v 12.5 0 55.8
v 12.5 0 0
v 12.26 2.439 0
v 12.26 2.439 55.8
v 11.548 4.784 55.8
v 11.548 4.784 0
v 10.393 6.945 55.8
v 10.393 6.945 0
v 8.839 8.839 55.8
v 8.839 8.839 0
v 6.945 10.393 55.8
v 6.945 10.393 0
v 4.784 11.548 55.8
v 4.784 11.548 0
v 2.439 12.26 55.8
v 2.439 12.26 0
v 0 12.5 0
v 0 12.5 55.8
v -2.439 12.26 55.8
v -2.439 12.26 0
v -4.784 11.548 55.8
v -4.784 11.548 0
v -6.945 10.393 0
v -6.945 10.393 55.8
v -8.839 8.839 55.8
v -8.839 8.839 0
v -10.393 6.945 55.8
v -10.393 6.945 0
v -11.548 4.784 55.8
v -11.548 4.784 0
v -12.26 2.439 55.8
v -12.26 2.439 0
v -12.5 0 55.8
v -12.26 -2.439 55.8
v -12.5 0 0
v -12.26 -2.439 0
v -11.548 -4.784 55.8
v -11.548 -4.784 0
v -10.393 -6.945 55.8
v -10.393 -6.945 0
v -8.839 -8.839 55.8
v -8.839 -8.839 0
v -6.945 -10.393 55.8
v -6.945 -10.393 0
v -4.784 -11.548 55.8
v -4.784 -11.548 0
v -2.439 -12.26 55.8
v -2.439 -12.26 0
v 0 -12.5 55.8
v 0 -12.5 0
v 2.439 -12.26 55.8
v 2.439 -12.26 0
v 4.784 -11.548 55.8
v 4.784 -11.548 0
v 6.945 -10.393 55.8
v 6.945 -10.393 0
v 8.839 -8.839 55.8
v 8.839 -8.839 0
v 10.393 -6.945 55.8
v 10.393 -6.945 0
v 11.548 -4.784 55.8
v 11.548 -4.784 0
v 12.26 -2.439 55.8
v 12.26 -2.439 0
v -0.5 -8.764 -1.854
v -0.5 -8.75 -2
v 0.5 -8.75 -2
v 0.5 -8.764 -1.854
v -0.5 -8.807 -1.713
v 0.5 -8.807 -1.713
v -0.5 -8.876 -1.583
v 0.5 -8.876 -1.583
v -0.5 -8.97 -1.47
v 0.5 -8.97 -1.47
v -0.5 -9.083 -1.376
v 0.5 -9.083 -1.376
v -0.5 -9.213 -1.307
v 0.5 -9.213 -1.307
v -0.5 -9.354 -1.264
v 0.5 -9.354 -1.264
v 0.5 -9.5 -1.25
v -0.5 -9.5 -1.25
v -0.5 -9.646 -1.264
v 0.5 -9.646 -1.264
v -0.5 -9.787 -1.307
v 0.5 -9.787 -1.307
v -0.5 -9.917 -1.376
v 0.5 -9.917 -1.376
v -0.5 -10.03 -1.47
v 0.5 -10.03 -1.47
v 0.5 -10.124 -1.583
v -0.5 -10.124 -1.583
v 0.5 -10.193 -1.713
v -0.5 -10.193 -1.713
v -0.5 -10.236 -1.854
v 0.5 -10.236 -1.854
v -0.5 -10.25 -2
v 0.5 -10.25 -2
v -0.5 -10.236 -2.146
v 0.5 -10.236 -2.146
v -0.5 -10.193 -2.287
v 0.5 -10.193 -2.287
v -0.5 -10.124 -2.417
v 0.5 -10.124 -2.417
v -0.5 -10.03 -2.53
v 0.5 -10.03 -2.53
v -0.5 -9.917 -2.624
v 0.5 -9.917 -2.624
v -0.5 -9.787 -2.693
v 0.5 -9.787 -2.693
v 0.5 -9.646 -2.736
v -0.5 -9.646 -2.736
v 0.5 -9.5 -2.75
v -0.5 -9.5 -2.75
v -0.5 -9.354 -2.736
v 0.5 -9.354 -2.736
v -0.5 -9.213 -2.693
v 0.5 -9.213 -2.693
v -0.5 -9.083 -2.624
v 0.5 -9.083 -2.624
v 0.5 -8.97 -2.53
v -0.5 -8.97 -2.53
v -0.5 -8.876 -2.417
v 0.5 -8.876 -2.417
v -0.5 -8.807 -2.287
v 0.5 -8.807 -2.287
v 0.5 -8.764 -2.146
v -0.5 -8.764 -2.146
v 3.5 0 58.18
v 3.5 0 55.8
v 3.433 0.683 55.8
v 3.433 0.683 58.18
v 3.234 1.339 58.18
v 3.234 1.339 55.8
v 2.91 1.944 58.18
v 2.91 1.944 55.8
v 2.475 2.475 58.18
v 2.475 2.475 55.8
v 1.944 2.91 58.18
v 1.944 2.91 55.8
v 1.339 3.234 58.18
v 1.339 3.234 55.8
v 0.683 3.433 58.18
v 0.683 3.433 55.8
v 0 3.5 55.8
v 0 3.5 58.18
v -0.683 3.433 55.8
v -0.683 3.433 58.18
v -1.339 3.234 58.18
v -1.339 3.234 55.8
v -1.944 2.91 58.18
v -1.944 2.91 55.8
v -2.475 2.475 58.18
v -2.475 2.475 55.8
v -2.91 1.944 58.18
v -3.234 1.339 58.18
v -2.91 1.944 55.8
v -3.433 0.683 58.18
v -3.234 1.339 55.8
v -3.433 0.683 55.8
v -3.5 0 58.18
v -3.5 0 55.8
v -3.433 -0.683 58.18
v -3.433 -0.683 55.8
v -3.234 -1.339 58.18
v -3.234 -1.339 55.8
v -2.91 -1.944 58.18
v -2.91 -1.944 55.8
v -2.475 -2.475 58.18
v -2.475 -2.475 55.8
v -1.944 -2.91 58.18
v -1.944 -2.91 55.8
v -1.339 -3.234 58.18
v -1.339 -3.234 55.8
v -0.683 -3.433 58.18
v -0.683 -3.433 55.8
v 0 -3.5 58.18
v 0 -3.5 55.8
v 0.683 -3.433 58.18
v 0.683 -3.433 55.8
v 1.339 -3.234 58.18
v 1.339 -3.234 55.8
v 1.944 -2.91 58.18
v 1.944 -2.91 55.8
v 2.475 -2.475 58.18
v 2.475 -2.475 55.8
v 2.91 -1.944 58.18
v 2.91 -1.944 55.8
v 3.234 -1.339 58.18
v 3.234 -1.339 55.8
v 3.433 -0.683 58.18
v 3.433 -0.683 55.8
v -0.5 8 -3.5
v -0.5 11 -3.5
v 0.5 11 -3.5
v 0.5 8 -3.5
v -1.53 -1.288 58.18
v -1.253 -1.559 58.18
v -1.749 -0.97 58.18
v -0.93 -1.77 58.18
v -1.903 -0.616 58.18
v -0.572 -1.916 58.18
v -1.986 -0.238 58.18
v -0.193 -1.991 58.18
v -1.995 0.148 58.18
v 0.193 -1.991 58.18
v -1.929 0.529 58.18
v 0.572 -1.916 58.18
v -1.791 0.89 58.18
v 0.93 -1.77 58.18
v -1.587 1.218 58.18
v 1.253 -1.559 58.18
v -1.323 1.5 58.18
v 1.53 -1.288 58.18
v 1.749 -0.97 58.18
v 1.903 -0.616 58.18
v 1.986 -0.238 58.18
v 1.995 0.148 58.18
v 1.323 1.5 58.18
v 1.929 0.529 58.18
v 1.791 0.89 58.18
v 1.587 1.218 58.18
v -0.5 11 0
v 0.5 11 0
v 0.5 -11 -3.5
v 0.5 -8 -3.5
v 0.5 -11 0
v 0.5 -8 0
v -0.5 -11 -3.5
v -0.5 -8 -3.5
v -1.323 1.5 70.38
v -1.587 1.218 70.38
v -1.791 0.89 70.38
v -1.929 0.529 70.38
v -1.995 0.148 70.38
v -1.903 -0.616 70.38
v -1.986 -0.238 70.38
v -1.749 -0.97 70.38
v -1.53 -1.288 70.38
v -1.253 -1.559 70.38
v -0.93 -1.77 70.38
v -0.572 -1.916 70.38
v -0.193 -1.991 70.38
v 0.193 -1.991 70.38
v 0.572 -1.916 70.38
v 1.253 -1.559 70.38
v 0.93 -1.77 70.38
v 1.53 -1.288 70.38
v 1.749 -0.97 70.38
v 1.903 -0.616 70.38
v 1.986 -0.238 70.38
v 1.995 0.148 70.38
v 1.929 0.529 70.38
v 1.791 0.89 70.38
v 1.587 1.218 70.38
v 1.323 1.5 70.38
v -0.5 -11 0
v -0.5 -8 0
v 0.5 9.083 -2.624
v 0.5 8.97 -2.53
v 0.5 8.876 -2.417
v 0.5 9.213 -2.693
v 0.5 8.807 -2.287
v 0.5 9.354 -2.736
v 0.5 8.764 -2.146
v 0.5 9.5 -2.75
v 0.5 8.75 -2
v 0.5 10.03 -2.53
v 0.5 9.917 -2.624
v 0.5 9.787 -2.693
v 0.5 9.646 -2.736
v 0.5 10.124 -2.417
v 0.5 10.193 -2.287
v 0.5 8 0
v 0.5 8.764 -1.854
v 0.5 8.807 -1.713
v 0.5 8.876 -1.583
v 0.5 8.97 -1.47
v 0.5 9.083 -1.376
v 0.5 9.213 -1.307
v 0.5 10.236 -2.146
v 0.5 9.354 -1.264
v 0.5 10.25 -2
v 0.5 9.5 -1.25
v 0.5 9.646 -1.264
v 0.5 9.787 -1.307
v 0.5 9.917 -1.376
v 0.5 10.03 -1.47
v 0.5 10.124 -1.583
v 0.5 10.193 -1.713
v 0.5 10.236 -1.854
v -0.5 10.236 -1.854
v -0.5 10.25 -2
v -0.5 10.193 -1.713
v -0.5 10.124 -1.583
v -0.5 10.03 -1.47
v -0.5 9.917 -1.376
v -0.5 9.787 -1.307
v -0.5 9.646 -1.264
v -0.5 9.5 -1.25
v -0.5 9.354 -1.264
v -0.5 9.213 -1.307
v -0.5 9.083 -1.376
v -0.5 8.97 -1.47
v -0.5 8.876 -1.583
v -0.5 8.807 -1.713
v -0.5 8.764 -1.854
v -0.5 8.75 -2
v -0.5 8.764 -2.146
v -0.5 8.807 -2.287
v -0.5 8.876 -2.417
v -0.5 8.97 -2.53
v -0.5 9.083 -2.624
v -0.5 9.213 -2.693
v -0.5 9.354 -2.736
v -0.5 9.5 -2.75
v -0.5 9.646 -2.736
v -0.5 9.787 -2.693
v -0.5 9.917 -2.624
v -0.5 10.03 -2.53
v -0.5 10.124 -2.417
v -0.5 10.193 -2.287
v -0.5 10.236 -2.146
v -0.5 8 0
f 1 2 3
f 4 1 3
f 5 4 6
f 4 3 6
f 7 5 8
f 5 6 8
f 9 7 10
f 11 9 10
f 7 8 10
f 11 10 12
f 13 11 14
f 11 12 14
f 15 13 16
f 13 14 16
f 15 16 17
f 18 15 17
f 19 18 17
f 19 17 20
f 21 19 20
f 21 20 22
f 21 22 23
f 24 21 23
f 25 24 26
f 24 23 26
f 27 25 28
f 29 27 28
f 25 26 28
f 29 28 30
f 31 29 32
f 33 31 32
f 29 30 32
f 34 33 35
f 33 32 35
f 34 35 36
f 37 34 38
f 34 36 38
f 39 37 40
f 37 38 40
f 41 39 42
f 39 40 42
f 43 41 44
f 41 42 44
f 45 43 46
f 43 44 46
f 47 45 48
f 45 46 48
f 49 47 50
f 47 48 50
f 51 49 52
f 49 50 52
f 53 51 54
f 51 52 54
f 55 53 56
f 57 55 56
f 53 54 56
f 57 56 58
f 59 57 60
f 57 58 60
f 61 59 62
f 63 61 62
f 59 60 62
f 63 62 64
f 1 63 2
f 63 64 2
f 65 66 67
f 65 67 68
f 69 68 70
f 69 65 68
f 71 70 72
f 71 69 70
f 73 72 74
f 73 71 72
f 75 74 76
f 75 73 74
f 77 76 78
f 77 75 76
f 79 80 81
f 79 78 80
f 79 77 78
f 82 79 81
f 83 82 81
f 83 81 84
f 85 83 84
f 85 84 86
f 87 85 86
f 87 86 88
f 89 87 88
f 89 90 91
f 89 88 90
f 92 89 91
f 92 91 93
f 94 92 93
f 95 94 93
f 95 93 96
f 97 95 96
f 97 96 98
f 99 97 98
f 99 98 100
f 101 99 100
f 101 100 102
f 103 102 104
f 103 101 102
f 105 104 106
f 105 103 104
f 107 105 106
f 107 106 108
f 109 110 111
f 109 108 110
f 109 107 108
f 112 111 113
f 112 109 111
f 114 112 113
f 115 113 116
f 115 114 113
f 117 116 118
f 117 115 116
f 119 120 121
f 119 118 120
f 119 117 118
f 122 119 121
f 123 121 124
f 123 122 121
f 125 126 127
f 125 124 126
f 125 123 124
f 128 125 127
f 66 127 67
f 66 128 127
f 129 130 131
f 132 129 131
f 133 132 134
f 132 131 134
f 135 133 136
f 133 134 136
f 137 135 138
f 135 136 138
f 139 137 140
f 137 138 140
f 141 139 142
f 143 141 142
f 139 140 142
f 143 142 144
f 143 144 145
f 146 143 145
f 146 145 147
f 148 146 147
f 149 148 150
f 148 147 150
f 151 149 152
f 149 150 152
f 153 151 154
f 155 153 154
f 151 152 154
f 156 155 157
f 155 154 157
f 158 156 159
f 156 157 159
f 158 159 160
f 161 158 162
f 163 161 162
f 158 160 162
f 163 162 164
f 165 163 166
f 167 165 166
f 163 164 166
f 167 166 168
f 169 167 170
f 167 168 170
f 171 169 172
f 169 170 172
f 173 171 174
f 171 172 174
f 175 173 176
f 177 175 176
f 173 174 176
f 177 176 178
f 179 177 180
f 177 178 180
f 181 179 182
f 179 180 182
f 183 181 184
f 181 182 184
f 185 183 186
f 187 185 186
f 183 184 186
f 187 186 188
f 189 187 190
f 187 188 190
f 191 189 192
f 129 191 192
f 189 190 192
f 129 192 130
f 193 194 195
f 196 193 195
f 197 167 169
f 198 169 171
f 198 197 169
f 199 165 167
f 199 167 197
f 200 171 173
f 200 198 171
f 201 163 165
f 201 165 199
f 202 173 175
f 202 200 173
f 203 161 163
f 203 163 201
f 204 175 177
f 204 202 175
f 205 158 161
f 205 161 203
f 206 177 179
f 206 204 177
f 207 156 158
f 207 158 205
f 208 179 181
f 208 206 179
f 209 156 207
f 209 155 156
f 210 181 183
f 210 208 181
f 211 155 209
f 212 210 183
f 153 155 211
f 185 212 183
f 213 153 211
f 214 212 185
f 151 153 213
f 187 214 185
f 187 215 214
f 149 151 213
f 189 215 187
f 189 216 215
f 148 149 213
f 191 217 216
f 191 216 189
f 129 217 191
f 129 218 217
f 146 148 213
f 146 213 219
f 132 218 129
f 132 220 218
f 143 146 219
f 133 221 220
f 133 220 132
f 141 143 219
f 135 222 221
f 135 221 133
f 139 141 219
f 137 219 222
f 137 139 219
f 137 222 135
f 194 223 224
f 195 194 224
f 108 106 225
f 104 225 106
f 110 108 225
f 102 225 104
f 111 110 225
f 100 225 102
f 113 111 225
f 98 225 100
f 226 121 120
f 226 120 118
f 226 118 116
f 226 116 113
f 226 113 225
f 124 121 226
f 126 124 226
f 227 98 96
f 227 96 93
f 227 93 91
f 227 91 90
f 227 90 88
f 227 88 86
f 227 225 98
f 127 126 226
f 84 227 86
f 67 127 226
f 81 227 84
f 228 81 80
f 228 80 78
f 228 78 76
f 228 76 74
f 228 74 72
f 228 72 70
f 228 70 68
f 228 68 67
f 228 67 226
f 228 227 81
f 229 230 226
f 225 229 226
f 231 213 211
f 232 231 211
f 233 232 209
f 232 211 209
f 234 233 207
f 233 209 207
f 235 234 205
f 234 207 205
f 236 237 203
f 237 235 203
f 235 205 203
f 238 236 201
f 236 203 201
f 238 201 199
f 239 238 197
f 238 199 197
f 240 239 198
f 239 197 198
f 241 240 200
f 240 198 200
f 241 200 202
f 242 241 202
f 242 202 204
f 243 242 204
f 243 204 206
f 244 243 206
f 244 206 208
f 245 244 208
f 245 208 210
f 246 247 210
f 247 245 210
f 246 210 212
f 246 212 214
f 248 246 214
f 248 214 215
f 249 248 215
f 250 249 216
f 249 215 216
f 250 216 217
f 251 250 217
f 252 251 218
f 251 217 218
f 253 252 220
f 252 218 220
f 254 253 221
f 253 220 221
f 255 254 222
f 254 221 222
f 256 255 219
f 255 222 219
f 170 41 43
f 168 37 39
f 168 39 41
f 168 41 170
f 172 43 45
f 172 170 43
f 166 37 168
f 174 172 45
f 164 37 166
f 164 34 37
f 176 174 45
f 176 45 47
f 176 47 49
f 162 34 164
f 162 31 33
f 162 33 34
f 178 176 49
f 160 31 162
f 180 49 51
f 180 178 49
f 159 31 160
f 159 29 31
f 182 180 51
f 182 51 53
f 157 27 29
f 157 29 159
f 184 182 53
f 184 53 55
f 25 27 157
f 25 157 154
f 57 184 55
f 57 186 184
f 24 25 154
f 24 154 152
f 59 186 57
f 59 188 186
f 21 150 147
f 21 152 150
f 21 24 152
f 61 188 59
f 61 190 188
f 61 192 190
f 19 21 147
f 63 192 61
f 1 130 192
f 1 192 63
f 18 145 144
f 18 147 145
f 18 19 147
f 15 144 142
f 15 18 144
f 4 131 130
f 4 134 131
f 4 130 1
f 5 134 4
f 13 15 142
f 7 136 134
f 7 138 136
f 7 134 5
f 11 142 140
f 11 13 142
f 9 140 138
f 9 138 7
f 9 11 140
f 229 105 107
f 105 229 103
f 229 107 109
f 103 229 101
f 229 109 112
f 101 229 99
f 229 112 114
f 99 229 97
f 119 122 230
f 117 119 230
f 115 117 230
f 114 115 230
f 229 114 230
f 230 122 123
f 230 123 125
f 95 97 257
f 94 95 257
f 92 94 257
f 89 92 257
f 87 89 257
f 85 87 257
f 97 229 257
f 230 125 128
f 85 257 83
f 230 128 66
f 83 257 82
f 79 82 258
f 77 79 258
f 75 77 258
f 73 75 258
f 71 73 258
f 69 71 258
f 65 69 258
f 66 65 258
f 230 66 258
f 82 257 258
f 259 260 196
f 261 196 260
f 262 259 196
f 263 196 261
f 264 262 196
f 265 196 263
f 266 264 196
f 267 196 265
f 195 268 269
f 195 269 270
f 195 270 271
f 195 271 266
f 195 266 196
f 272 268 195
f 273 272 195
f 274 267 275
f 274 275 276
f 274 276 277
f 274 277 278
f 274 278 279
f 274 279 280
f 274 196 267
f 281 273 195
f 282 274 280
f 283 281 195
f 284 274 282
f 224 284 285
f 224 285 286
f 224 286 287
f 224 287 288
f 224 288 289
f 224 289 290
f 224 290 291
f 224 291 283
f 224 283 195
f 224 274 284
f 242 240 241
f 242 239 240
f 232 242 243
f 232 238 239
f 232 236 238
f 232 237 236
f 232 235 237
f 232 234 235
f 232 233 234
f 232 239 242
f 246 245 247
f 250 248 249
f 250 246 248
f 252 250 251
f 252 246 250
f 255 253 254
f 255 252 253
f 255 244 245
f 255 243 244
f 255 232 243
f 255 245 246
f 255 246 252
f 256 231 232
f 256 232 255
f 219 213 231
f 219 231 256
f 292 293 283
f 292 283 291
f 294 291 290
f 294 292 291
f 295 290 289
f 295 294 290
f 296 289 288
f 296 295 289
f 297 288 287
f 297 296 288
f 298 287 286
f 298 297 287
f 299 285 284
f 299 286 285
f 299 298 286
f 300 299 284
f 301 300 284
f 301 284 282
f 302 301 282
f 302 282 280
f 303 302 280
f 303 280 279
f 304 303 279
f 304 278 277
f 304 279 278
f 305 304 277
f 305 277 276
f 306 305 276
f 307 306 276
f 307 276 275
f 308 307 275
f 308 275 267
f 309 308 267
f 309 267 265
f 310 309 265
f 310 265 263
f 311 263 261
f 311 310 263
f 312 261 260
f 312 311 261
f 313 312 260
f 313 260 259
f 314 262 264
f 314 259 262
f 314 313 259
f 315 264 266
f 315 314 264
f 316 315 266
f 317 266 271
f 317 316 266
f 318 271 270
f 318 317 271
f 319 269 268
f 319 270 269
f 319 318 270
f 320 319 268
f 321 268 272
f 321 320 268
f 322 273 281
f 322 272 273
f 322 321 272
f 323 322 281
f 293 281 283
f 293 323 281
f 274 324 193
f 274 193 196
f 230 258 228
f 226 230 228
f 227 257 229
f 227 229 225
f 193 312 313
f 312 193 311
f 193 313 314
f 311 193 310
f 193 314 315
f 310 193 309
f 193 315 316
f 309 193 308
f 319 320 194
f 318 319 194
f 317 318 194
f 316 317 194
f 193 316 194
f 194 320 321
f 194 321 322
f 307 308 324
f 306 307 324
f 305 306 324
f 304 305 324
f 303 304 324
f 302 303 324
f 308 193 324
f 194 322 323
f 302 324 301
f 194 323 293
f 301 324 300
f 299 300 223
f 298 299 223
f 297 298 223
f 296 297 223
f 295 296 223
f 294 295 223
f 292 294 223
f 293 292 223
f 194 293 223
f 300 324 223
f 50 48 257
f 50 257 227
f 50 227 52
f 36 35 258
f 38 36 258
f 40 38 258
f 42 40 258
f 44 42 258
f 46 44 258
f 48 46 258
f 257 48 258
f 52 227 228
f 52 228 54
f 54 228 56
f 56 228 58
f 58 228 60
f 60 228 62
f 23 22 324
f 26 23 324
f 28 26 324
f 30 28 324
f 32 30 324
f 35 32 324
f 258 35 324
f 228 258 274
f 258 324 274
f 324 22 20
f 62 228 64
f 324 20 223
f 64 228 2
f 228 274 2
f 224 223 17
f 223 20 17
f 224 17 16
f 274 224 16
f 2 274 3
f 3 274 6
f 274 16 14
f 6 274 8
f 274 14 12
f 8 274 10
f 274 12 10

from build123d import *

# Parameters (mm, degrees)
SKETCH1_R               = 12.5
BOSS_EXTRUDE1_DEPTH     = 55.8
BOSS_EXTRUDE2_START     = 55.8
SKETCH2_R               = 3.5
BOSS_EXTRUDE2_DEPTH     = 2.38
BOSS_EXTRUDE3_START     = 58.18
SKETCH3_R               = 2
BOSS_EXTRUDE3_DEPTH     = 12.2
SKETCH5_W               = 2.645751312
SKETCH5_H               = 1.197132969
CUT_EXTRUDE1_DEPTH      = 12.2
SKETCH6_W               = 1
SKETCH6_H               = 3
BOSS_EXTRUDE4_DEPTH     = 3.5
CUT_EXTRUDE2_DEPTH      = 73.566138109
CUT_EXTRUDE2_DEPTH_BACK = 73.566138109
SKETCH7_R               = 0.75


with BuildPart() as part:
    # Sketch1 → Boss-Extrude1 (new body)
    with BuildSketch(Plane.XY):
        Circle(SKETCH1_R)
    extrude(amount=BOSS_EXTRUDE1_DEPTH)

    # Sketch2 → Boss-Extrude2 (add)
    with BuildSketch(Plane.XY.offset(BOSS_EXTRUDE2_START)):
        Circle(SKETCH2_R)
    extrude(amount=BOSS_EXTRUDE2_DEPTH)

    # Sketch3 → Boss-Extrude3 (add)
    with BuildSketch(Plane.XY.offset(BOSS_EXTRUDE3_START)):
        Circle(SKETCH3_R)
    extrude(amount=BOSS_EXTRUDE3_DEPTH)

    # Sketch5 → Cut-Extrude1 (cut)
    with BuildSketch(Plane.XY.offset(58.18)):
        with Locations((0, 2.098566485)):
            Rectangle(SKETCH5_W, SKETCH5_H)
    extrude(amount=CUT_EXTRUDE1_DEPTH, mode=Mode.SUBTRACT)

    # Sketch6 → Boss-Extrude4 (add)
    with BuildSketch(Plane.XY):
        with Locations((0, 9.5)):
            Rectangle(SKETCH6_W, SKETCH6_H)
        with Locations((0, -9.5)):
            Rectangle(SKETCH6_W, SKETCH6_H)
    extrude(amount=-BOSS_EXTRUDE4_DEPTH)

    # Sketch7 → Cut-Extrude2 (cut, two sides: drawn at the far end of the back side and taken through both)
    with BuildSketch(Plane(origin=(0, 0, 0), x_dir=(0, 0, -1), z_dir=(1, 0, 0)).offset(-CUT_EXTRUDE2_DEPTH_BACK)):
        with Locations(Location((2, 9.5, 0), (0, 0, 90))):
            Circle(SKETCH7_R)
        with Locations(Location((2, -9.5, 0), (0, 0, 90))):
            Circle(SKETCH7_R)
    extrude(amount=CUT_EXTRUDE2_DEPTH + CUT_EXTRUDE2_DEPTH_BACK, mode=Mode.SUBTRACT)


solid = part.part
